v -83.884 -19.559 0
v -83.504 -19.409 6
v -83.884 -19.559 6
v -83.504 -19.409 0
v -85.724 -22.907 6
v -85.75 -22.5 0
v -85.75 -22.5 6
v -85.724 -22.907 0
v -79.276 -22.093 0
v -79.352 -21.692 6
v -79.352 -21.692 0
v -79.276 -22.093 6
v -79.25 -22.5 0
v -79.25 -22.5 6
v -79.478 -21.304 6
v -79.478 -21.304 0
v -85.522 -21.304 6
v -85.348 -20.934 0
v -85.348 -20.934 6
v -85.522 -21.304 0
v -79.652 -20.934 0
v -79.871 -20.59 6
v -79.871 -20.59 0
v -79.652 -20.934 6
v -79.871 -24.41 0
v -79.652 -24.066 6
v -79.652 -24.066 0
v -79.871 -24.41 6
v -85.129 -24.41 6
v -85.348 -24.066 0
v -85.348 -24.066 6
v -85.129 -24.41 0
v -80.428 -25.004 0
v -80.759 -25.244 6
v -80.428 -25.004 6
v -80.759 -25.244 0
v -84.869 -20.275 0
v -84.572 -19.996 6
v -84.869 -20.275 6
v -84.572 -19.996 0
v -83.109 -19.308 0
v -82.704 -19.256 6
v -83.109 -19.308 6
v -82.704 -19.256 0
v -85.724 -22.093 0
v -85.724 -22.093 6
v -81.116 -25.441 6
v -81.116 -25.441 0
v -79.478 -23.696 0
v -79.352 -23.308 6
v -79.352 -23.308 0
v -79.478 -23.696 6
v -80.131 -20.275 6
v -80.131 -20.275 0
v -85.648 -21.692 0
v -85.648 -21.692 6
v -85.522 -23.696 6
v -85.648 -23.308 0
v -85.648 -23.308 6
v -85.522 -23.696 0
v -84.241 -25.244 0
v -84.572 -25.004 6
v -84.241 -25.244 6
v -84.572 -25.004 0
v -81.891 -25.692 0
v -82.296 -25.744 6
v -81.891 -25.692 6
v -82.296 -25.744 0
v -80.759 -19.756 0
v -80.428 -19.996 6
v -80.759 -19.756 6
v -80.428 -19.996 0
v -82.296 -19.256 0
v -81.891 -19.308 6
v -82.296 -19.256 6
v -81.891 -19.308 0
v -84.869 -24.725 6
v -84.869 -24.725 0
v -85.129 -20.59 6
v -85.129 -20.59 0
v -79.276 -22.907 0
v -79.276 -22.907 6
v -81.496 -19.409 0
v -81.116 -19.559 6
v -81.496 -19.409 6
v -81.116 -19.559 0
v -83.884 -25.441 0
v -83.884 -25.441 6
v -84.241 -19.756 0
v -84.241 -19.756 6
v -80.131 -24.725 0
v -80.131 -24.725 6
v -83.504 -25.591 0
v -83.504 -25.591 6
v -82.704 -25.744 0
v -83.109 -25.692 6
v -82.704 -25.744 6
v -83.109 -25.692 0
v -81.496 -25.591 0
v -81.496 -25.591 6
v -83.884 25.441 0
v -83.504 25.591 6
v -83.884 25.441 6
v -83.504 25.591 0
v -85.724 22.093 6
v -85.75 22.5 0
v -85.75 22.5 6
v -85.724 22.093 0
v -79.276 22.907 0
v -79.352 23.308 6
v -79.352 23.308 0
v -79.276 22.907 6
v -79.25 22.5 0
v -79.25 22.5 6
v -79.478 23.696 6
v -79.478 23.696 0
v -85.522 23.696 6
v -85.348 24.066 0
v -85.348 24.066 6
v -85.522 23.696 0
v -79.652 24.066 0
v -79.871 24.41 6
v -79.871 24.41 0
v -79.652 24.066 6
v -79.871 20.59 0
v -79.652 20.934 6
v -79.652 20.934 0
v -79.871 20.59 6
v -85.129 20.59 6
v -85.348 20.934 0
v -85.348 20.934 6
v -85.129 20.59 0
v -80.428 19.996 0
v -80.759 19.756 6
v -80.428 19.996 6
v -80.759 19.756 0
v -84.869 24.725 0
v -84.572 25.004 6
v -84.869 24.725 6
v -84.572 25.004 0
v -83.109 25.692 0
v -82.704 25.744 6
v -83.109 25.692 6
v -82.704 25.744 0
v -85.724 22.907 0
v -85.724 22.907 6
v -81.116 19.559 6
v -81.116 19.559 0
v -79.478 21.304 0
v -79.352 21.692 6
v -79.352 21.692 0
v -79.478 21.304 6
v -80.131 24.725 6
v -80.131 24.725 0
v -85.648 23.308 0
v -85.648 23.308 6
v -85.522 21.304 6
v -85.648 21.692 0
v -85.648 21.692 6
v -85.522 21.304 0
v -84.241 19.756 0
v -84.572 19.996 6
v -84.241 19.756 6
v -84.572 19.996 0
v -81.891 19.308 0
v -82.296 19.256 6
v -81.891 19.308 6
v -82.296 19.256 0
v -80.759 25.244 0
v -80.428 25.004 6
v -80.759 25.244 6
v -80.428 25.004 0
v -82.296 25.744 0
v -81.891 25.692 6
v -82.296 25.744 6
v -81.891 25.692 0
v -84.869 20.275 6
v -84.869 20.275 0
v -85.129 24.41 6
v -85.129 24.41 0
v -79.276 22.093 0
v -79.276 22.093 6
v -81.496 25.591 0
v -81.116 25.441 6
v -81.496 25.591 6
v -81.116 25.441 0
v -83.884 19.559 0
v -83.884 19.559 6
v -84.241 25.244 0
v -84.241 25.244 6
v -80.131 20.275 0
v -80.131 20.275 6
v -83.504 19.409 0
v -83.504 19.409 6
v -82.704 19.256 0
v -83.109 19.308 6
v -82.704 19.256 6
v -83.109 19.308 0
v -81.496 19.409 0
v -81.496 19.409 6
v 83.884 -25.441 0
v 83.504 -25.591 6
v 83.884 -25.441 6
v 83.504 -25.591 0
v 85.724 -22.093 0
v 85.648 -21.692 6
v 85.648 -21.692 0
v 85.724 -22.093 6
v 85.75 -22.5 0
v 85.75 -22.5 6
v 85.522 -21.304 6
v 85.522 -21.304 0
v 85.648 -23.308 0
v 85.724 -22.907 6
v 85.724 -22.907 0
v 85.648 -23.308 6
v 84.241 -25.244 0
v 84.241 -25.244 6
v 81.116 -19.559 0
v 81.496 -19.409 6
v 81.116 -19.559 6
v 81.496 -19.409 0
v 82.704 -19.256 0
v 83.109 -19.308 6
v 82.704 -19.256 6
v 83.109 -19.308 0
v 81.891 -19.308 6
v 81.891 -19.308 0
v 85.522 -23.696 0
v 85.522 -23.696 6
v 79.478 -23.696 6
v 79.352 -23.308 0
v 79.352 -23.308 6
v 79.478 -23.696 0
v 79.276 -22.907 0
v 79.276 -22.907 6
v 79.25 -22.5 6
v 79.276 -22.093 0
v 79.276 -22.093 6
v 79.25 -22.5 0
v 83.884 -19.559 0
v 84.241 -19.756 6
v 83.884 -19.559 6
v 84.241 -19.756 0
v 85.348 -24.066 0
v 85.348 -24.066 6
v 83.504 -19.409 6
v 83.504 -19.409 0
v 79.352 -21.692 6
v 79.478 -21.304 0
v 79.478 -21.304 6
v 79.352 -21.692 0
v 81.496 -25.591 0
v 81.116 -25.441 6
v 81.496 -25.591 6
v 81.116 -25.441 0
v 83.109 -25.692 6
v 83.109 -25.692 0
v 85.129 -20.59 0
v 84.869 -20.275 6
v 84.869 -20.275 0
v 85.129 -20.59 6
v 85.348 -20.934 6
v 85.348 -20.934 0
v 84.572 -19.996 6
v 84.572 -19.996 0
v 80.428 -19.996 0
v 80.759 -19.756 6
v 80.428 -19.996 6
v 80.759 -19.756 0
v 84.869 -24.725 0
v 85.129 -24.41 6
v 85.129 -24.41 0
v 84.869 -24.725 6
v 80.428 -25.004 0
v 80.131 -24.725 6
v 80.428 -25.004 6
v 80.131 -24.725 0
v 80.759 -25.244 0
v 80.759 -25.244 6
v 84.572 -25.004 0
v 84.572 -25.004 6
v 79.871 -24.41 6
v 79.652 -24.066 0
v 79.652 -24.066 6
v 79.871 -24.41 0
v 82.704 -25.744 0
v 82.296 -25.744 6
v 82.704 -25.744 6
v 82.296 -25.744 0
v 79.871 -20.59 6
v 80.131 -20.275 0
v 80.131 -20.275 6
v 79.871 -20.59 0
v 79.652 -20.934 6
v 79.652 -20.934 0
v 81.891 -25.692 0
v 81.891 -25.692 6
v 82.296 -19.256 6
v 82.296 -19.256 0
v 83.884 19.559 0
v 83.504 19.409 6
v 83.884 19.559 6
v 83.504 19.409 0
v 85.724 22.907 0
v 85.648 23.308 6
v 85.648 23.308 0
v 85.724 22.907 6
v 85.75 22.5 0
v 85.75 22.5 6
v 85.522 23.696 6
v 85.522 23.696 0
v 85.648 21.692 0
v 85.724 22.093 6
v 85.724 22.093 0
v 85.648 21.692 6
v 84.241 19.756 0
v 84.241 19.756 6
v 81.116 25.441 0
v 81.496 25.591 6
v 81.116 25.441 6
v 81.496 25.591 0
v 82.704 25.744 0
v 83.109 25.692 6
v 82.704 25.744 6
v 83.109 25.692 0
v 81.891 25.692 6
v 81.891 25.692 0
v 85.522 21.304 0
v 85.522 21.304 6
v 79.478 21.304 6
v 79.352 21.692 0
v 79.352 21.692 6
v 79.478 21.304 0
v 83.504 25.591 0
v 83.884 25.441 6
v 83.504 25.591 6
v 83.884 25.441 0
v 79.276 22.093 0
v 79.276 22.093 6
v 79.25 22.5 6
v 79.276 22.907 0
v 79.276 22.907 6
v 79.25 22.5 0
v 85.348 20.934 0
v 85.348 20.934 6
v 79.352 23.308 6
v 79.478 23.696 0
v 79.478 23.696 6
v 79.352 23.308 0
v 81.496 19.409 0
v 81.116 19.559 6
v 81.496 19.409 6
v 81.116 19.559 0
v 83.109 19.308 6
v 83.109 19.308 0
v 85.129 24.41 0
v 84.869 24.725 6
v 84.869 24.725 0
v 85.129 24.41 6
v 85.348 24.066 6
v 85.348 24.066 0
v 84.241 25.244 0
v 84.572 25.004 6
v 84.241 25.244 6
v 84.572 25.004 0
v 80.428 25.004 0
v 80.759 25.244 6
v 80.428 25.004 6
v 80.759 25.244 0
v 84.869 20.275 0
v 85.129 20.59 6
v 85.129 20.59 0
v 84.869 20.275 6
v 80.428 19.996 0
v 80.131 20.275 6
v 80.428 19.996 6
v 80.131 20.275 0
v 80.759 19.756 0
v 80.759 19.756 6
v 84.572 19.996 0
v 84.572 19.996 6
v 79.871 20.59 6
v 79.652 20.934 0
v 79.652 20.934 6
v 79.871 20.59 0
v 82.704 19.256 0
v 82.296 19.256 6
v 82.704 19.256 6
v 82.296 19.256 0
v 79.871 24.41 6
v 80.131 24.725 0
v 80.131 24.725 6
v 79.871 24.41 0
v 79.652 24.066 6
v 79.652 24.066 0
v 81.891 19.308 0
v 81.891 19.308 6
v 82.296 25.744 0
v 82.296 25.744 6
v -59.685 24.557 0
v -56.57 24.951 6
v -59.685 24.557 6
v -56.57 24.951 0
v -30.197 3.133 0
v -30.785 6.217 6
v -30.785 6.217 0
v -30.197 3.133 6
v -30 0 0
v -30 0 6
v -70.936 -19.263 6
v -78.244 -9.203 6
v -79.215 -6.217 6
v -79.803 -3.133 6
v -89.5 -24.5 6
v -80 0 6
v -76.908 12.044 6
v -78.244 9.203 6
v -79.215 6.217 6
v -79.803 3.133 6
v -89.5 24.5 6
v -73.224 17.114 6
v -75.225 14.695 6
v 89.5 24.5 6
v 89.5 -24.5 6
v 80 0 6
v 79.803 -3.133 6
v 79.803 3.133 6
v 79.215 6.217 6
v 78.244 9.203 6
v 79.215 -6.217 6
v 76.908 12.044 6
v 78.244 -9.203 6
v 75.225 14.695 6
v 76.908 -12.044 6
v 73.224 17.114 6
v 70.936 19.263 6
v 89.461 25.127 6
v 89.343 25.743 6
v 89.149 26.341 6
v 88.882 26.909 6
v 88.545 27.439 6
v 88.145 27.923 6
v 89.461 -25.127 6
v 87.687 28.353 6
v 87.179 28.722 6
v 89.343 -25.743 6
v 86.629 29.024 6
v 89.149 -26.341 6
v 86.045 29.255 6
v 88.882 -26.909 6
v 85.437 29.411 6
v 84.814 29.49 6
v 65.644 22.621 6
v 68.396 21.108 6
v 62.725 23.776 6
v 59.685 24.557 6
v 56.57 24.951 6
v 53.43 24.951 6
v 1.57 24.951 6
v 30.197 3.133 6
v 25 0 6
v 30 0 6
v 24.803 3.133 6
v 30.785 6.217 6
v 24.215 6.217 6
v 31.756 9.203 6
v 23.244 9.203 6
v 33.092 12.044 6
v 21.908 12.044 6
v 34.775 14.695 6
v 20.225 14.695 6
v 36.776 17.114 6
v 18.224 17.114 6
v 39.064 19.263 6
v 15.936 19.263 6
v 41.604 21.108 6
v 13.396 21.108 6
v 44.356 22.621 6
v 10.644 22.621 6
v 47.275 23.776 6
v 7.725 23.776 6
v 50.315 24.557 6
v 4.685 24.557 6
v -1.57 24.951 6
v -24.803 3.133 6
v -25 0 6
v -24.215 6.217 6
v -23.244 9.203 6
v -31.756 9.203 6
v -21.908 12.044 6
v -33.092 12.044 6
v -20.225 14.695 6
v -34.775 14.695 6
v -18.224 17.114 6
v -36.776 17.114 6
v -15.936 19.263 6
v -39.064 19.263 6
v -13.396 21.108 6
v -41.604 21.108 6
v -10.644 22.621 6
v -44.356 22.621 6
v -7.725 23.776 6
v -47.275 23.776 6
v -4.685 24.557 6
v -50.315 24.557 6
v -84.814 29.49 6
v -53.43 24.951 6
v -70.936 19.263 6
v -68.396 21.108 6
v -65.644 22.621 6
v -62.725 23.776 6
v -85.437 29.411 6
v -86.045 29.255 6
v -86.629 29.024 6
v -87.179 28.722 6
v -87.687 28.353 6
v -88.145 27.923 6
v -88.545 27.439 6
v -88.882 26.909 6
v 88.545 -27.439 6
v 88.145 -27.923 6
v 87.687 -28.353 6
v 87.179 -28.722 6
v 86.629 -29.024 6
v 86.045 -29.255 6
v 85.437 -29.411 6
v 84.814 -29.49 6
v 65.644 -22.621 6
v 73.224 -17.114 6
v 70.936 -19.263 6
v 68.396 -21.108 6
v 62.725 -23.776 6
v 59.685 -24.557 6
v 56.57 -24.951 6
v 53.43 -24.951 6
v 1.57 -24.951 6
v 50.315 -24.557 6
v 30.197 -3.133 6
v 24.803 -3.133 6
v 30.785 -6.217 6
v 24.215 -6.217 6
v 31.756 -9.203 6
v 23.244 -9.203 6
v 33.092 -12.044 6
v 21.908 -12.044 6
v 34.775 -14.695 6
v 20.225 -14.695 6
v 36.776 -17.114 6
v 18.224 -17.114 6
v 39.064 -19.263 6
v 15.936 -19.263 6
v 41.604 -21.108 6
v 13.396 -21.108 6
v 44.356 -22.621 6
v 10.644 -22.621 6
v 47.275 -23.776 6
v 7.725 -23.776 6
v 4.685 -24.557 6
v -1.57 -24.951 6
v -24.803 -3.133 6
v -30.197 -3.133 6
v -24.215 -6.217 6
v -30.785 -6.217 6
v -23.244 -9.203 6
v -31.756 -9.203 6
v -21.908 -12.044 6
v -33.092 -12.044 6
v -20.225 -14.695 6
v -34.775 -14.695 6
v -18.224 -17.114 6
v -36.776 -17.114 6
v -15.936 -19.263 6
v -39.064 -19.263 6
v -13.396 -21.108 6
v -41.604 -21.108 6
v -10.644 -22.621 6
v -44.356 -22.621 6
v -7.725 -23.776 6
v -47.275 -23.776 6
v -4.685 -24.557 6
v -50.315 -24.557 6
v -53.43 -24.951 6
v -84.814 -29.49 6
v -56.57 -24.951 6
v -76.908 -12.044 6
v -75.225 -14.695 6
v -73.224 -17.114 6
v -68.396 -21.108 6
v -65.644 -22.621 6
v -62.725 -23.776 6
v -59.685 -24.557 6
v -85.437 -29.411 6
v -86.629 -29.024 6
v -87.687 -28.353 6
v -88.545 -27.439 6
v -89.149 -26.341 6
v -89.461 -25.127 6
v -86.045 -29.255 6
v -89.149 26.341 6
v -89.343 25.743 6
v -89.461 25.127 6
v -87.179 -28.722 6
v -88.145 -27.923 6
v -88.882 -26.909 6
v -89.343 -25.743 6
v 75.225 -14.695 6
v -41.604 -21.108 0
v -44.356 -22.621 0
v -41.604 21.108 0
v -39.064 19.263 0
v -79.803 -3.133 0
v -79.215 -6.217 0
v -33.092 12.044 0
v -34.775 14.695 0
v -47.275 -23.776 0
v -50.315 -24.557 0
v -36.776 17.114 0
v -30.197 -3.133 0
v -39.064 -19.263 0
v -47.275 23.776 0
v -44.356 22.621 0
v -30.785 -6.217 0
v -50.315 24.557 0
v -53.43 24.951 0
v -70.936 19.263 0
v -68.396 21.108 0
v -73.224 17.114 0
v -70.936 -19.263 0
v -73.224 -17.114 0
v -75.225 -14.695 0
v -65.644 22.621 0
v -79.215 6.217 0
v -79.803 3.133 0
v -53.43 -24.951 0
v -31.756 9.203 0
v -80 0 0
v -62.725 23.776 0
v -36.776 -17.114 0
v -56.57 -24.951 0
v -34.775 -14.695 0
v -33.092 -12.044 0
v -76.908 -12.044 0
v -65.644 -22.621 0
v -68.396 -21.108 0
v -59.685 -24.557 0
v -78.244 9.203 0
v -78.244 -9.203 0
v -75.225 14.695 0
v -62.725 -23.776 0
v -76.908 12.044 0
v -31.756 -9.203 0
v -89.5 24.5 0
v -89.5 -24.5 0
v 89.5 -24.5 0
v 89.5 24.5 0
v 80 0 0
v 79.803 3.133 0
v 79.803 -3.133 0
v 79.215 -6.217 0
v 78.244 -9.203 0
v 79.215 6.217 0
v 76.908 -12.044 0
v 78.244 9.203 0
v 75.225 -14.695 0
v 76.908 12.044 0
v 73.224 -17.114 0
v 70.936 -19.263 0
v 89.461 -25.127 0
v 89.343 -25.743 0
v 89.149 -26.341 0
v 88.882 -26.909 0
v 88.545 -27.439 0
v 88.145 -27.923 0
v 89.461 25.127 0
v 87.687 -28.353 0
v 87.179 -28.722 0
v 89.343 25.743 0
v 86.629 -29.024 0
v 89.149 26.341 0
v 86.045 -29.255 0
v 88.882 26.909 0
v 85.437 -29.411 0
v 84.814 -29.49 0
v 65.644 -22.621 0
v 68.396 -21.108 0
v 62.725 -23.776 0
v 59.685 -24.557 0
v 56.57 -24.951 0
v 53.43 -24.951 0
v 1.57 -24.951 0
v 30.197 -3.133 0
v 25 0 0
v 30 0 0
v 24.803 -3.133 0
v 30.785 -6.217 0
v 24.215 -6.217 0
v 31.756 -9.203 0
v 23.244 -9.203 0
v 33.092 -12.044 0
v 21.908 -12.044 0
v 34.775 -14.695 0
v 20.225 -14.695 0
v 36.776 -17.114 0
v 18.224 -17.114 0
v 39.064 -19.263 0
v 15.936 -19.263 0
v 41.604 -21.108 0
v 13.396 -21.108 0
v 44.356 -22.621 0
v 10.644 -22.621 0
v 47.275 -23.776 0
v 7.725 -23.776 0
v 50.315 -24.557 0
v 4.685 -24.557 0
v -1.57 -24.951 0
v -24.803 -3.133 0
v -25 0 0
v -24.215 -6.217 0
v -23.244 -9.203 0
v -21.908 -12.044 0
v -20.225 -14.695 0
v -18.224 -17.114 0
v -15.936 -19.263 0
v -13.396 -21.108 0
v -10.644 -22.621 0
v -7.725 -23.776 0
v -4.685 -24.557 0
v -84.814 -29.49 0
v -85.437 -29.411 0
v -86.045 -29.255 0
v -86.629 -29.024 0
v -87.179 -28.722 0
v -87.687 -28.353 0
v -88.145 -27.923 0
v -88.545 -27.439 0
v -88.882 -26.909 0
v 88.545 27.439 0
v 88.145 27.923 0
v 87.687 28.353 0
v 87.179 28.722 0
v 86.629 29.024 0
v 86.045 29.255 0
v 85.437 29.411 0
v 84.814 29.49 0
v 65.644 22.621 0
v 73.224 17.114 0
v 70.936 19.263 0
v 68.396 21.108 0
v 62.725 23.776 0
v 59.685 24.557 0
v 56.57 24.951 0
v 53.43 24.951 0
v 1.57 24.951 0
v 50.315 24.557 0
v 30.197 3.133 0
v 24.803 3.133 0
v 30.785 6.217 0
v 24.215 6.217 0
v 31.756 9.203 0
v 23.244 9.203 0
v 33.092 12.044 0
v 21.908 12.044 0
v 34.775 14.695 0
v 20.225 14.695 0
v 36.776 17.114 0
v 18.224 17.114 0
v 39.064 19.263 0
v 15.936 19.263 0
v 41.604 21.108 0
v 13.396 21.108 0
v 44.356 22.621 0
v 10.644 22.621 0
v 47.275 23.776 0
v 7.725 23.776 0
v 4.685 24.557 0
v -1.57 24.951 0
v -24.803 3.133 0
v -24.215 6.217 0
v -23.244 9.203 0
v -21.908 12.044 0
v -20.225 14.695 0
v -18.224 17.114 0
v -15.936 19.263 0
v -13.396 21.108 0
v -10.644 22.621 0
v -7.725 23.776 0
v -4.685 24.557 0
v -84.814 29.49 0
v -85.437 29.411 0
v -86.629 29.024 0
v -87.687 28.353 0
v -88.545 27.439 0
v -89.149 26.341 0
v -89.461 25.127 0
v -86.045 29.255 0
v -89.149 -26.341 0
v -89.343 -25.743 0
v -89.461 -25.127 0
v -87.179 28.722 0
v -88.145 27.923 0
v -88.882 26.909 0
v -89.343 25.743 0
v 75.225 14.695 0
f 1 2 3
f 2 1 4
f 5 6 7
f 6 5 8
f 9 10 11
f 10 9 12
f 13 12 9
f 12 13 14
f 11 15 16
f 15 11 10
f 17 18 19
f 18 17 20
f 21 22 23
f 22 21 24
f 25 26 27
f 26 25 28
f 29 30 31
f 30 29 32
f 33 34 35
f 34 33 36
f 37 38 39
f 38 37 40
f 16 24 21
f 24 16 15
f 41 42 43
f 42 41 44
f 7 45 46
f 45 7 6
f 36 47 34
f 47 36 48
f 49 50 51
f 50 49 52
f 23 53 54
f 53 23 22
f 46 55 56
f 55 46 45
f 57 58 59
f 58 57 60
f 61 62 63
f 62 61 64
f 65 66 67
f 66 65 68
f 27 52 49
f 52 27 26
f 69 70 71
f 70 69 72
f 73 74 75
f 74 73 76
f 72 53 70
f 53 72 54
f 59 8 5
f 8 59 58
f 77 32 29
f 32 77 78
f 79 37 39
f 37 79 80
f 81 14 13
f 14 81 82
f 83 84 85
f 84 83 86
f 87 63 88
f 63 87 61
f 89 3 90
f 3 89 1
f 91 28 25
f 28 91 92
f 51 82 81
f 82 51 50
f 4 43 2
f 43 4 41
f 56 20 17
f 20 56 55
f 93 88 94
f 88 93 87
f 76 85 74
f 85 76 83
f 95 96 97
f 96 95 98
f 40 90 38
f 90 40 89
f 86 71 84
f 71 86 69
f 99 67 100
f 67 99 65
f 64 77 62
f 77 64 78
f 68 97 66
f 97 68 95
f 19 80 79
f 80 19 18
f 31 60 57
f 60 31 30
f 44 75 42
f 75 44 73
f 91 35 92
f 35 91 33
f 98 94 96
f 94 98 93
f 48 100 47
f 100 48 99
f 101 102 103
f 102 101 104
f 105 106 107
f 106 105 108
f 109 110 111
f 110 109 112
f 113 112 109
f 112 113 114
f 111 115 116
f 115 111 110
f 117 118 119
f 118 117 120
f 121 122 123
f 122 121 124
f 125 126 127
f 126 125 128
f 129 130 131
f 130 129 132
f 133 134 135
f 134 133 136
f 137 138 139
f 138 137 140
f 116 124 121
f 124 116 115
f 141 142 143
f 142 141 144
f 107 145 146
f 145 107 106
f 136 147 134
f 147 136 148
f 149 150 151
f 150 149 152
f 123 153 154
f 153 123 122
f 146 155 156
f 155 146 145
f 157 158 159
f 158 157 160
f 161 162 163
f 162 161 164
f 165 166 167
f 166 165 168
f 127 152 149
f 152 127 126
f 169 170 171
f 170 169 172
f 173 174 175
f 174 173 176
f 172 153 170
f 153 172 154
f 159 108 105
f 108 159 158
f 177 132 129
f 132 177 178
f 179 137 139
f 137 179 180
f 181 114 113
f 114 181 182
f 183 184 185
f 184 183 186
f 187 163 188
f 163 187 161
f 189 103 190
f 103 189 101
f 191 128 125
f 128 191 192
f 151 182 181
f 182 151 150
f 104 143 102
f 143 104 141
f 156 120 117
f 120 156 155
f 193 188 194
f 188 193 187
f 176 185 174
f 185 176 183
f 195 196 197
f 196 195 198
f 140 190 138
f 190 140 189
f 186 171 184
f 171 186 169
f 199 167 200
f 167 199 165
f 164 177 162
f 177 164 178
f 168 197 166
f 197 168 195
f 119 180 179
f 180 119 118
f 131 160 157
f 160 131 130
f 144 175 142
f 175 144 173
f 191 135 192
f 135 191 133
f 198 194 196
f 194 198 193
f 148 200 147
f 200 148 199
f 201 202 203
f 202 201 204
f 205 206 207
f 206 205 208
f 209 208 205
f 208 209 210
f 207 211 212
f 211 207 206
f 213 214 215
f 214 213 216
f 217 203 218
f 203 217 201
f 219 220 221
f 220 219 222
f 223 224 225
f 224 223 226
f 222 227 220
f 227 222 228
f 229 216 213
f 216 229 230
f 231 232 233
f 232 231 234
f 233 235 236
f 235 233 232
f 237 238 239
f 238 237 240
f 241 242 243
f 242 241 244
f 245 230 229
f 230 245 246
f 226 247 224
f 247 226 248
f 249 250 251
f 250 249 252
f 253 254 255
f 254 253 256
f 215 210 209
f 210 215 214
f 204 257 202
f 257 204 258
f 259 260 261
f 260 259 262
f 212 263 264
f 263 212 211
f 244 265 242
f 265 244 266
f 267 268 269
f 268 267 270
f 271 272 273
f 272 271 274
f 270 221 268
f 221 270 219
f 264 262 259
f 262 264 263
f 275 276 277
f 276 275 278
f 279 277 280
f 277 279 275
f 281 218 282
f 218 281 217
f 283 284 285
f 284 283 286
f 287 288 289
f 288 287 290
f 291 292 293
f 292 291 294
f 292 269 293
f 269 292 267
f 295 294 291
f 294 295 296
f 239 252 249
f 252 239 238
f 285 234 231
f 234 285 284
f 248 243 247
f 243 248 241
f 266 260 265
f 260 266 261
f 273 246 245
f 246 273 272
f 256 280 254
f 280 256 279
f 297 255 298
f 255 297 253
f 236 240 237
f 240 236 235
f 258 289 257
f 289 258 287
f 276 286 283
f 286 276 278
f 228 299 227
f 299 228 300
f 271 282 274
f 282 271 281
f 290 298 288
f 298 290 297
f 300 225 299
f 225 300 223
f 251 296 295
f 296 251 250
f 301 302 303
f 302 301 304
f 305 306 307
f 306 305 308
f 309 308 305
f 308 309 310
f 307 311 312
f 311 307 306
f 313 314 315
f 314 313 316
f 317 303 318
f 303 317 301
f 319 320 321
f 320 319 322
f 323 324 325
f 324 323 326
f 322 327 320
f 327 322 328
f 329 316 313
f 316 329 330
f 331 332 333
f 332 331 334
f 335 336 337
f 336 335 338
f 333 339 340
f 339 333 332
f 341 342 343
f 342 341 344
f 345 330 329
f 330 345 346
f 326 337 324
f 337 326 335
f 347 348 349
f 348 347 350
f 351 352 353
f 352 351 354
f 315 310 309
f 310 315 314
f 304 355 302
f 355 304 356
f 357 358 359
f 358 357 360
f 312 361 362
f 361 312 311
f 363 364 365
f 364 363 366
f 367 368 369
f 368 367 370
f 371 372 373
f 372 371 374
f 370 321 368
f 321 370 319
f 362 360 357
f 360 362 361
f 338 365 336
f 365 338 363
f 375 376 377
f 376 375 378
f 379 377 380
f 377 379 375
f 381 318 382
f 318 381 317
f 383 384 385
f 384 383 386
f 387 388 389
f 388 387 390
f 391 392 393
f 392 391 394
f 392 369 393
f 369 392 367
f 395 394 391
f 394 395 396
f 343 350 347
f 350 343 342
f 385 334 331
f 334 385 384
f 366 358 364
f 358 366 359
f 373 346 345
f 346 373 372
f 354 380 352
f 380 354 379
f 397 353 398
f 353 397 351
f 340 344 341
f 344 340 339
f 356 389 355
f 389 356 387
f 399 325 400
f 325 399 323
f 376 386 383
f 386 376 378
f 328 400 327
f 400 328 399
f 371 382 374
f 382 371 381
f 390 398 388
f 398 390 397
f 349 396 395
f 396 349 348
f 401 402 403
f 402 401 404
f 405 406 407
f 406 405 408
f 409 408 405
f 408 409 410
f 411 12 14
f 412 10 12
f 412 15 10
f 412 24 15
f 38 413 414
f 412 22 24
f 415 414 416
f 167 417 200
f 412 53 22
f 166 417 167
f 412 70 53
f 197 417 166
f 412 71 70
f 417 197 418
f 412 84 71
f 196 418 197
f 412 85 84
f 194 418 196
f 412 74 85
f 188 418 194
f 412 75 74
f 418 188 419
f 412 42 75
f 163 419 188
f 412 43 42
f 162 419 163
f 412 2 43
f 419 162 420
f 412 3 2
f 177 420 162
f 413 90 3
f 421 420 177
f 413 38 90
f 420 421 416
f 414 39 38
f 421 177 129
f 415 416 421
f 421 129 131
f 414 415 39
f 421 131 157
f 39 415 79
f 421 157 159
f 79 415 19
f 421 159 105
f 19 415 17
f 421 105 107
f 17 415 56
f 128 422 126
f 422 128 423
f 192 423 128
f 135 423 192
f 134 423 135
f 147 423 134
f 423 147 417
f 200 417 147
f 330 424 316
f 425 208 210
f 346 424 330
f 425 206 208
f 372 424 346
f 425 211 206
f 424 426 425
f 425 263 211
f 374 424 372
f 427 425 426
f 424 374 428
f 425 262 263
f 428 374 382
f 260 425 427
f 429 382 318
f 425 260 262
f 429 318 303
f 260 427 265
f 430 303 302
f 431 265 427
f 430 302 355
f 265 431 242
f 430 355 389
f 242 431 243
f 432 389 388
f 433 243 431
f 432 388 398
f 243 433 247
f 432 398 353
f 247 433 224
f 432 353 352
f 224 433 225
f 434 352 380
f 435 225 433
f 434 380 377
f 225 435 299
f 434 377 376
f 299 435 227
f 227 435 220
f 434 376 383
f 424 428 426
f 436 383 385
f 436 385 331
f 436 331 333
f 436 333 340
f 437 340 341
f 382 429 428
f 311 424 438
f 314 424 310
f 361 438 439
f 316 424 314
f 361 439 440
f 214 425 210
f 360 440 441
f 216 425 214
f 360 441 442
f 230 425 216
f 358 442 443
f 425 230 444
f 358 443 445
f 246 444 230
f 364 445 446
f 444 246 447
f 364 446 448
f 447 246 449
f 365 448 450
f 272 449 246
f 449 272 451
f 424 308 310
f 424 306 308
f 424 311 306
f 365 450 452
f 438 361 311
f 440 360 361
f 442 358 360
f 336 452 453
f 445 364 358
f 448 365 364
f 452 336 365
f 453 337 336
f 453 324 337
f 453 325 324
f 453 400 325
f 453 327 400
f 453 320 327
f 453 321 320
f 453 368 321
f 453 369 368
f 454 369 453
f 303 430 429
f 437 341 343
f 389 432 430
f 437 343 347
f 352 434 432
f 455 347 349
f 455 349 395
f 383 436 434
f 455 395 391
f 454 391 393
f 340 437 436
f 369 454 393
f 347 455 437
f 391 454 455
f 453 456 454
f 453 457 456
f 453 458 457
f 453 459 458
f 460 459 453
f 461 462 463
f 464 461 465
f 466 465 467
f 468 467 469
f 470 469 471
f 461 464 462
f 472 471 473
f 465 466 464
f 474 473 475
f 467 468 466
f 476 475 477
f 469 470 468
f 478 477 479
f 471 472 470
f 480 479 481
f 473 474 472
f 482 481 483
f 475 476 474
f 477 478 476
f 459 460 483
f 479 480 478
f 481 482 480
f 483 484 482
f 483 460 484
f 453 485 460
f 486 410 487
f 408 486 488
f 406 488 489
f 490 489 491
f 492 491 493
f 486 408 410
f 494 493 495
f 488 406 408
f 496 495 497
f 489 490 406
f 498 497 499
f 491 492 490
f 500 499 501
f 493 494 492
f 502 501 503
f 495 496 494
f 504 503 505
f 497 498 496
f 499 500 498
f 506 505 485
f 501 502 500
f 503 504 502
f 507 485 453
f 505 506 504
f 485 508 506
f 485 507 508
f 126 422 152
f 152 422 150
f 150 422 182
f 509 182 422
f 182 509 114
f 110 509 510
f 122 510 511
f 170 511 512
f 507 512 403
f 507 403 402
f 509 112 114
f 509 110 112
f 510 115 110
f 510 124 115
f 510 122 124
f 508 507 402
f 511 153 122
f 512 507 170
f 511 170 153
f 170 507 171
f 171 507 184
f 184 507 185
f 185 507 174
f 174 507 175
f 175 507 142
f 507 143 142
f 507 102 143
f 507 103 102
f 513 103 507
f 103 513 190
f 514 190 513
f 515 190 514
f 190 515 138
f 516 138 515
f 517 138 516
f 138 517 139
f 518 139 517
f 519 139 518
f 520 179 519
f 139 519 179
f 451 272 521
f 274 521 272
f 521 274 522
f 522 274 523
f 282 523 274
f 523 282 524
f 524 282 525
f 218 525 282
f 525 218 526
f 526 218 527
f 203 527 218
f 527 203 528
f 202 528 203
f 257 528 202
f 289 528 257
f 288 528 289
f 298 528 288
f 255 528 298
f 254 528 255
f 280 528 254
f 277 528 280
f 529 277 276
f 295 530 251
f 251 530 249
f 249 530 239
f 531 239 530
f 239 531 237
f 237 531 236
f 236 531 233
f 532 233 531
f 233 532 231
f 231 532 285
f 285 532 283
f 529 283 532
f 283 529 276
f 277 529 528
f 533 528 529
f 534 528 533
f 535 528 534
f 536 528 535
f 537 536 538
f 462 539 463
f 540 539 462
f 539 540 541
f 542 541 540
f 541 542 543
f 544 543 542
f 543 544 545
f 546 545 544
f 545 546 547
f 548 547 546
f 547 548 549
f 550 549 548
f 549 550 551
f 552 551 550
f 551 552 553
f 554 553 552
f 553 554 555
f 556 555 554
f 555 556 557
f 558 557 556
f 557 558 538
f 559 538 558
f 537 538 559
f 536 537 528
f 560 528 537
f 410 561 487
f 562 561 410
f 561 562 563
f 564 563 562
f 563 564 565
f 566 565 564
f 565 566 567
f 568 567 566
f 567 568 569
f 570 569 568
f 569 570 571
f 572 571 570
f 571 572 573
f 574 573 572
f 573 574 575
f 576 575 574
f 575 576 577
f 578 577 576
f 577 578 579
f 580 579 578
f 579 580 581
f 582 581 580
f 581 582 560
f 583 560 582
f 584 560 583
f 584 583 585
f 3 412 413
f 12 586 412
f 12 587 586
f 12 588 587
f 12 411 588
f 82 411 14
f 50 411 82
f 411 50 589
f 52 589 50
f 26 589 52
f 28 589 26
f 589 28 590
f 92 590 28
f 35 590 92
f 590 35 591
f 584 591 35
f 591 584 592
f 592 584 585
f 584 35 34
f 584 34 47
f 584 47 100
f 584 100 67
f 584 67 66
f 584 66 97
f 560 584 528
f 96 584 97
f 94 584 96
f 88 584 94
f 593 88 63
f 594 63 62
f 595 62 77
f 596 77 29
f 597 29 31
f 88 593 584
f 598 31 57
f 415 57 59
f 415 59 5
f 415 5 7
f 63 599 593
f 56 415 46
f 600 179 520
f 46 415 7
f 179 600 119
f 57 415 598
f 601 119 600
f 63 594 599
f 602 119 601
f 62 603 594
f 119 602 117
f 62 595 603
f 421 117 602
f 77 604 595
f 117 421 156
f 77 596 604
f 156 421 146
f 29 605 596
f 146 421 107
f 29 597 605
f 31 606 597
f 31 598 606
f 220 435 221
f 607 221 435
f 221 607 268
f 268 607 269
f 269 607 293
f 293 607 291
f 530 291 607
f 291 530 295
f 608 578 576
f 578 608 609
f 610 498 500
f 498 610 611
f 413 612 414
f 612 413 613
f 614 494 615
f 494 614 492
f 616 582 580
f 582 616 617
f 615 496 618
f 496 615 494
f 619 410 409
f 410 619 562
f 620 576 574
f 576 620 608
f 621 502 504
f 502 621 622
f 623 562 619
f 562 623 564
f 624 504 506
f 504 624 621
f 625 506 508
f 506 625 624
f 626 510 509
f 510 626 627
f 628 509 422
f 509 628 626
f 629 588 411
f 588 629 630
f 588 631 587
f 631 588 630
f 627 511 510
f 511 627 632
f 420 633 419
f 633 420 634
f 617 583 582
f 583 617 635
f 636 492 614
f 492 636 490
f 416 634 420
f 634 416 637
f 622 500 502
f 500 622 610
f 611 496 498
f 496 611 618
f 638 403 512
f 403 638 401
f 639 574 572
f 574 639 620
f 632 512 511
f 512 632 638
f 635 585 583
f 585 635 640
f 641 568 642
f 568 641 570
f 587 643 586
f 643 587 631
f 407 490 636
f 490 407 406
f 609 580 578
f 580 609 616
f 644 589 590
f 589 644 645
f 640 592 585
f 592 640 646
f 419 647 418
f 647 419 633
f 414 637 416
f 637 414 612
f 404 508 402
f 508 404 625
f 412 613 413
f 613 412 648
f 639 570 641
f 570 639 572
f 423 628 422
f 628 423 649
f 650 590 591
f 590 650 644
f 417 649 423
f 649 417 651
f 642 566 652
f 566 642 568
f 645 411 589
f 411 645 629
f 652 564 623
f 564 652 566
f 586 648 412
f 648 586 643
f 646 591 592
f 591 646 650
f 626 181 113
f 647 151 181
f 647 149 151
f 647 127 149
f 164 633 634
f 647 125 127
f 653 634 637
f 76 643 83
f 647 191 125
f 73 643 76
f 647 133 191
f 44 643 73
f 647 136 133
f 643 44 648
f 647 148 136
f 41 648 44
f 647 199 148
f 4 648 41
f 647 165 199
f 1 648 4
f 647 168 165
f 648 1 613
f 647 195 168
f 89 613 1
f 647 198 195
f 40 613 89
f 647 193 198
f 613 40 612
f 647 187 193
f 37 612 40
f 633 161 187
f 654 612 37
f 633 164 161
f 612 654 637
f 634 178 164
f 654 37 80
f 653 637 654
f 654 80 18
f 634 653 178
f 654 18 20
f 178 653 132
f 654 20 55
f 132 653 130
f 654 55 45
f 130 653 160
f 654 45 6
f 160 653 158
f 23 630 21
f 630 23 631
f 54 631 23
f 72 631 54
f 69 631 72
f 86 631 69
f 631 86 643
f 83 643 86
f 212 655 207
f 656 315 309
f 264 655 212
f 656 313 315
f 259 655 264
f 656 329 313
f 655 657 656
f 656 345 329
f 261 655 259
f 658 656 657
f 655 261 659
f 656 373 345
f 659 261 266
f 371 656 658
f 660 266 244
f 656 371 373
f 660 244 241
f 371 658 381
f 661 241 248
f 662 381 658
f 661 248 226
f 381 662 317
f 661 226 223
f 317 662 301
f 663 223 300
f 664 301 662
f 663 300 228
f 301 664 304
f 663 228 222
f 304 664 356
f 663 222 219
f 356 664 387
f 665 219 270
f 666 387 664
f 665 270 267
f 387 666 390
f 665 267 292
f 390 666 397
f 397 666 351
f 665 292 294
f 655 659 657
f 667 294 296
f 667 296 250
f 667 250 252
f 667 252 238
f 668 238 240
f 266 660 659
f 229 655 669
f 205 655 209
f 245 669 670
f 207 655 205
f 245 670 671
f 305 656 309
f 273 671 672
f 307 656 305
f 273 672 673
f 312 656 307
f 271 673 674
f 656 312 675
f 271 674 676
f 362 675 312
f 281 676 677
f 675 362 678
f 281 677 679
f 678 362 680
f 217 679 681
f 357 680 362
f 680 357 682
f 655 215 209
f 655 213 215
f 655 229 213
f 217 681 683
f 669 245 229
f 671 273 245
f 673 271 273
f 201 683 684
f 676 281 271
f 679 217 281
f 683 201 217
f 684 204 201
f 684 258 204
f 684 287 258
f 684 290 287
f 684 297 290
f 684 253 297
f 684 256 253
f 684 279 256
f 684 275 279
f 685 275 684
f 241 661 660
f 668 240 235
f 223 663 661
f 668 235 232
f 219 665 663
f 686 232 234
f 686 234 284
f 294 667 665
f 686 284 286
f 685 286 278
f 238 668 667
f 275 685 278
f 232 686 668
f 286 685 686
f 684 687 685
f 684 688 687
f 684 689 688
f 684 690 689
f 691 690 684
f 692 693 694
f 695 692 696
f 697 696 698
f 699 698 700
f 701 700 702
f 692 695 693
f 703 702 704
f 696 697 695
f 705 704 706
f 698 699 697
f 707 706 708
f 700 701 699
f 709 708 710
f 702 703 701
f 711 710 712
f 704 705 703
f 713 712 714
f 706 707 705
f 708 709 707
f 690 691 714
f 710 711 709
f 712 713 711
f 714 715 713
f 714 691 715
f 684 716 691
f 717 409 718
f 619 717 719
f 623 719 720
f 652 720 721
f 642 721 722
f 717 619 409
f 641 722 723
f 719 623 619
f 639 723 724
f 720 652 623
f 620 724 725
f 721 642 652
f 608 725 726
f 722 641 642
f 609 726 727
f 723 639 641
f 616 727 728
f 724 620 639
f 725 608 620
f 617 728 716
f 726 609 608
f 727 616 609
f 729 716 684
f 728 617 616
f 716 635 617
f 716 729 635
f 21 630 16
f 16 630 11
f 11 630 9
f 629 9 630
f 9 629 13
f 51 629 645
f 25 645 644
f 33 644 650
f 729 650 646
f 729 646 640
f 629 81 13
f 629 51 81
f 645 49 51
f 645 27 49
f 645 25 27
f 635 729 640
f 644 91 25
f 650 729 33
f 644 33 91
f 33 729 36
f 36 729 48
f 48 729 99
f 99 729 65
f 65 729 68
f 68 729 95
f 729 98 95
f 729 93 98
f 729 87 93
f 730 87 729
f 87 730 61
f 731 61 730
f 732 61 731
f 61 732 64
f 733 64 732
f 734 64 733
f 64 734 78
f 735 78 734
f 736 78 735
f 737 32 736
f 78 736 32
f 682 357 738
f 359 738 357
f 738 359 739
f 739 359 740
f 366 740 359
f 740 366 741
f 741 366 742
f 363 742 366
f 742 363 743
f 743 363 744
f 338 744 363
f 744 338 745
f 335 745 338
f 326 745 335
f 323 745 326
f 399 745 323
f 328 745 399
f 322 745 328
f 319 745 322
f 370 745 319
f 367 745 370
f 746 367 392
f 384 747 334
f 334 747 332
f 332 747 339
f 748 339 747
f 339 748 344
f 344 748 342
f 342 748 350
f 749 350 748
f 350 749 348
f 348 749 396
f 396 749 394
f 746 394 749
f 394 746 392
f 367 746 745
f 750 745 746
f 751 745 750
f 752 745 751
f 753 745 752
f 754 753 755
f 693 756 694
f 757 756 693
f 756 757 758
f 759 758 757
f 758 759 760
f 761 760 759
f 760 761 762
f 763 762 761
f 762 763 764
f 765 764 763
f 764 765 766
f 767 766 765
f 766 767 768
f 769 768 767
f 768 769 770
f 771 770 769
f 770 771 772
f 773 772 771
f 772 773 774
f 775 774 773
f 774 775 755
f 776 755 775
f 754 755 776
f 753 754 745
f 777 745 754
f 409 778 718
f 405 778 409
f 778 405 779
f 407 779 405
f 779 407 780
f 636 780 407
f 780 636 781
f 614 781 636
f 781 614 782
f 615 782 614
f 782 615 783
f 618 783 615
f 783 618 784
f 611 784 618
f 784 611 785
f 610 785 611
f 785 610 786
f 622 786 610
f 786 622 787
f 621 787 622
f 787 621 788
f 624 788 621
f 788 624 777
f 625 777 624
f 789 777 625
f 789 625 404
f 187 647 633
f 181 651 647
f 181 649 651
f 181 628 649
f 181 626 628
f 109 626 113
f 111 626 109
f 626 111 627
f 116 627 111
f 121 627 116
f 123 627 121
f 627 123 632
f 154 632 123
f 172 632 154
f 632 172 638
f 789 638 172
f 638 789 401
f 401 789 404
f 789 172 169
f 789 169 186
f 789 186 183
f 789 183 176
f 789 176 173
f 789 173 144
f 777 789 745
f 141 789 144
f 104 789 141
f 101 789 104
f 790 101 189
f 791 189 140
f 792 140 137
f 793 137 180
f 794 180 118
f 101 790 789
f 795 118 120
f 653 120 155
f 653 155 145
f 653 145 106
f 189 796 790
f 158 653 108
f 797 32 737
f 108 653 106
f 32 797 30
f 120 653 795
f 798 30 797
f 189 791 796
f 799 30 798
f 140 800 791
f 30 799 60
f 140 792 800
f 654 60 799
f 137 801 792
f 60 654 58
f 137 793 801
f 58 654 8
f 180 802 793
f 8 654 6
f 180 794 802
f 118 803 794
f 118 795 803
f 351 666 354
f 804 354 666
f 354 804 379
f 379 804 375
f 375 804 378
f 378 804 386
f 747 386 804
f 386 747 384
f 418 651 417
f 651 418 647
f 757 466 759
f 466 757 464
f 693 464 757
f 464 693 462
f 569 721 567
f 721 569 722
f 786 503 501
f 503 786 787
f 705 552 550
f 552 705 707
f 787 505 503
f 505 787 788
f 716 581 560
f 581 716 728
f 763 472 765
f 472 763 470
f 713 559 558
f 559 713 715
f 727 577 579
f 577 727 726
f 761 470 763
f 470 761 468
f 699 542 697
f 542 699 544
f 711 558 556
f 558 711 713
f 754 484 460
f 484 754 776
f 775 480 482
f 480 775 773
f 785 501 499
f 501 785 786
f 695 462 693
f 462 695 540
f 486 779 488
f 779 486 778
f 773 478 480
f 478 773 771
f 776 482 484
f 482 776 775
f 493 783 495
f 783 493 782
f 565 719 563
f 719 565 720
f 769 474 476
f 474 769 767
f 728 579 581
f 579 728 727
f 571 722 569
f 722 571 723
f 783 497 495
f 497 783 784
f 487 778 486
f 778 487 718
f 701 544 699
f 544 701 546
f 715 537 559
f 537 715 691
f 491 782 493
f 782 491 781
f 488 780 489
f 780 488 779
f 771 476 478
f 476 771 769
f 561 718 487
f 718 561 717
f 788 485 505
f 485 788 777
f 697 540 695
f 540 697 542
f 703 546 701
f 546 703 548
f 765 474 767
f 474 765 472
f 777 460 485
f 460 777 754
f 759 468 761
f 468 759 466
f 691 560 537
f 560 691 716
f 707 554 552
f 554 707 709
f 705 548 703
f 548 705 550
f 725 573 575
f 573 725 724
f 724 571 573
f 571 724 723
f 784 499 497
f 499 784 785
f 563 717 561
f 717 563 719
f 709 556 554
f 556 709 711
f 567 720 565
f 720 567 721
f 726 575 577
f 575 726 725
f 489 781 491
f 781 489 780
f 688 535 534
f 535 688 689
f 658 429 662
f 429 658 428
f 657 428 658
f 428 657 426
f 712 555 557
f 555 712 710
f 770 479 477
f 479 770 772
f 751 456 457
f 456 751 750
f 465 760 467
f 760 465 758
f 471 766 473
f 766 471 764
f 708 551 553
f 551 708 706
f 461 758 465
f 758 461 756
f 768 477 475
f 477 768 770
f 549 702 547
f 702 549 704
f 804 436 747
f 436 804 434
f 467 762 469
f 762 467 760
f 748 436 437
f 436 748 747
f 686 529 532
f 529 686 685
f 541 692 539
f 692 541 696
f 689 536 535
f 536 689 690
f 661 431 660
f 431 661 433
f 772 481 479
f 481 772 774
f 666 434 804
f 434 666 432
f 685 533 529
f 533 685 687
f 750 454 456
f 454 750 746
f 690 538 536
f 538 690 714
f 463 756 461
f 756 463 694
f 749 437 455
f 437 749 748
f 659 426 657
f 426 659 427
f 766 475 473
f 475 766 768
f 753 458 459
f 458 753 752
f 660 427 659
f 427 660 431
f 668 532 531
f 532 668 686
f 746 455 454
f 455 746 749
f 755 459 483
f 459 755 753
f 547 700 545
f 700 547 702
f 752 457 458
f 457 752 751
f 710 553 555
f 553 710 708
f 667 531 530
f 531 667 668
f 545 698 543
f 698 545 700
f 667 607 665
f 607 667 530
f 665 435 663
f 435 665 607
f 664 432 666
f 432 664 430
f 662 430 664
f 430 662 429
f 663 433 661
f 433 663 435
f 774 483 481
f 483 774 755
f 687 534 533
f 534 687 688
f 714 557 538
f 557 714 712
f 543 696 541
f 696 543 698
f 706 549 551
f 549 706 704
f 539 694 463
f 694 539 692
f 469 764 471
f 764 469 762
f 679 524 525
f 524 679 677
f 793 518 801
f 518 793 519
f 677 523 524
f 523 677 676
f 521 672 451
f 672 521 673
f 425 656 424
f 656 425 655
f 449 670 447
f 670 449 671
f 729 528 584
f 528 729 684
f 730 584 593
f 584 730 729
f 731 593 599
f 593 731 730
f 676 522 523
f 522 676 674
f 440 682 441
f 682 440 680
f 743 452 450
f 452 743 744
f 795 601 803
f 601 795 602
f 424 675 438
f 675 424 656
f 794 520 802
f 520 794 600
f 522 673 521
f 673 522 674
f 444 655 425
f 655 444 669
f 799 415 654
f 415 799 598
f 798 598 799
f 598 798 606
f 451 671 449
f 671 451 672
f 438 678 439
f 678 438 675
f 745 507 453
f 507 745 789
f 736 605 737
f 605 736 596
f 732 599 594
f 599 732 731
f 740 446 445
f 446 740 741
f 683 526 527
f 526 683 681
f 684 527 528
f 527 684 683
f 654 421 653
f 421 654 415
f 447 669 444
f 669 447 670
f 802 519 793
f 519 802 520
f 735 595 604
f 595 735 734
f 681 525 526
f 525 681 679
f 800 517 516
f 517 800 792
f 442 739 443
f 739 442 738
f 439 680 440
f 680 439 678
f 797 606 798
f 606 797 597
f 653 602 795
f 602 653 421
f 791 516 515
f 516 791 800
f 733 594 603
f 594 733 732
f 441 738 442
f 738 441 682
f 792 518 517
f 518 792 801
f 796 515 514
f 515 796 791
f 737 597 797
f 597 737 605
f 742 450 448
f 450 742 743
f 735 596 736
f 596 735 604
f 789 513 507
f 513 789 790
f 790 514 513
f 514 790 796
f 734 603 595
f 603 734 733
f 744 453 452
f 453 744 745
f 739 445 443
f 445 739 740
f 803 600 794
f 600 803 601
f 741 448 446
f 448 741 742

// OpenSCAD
$fn = 50;


difference() {
	union() {
		hull() {
			translate(v = [-84.5000000000, 24.5000000000, 0]) {
				cylinder(h = 6, r = 5);
			}
			translate(v = [84.5000000000, 24.5000000000, 0]) {
				cylinder(h = 6, r = 5);
			}
			translate(v = [-84.5000000000, -24.5000000000, 0]) {
				cylinder(h = 6, r = 5);
			}
			translate(v = [84.5000000000, -24.5000000000, 0]) {
				cylinder(h = 6, r = 5);
			}
		}
	}
	union() {
		#translate(v = [-82.5000000000, -22.5000000000, -100.0000000000]) {
			cylinder(h = 200, r = 3.2500000000);
		}
		#translate(v = [-82.5000000000, 22.5000000000, -100.0000000000]) {
			cylinder(h = 200, r = 3.2500000000);
		}
		#translate(v = [82.5000000000, -22.5000000000, -100.0000000000]) {
			cylinder(h = 200, r = 3.2500000000);
		}
		#translate(v = [82.5000000000, 22.5000000000, -100.0000000000]) {
			cylinder(h = 200, r = 3.2500000000);
		}
		#translate(v = [-55.0000000000, 0, 0]) {
			cylinder(h = 6, r = 25.0000000000);
		}
		#cylinder(h = 6, r = 25.0000000000);
		#translate(v = [55.0000000000, 0, 0]) {
			cylinder(h = 6, r = 25.0000000000);
		}
	}
}
